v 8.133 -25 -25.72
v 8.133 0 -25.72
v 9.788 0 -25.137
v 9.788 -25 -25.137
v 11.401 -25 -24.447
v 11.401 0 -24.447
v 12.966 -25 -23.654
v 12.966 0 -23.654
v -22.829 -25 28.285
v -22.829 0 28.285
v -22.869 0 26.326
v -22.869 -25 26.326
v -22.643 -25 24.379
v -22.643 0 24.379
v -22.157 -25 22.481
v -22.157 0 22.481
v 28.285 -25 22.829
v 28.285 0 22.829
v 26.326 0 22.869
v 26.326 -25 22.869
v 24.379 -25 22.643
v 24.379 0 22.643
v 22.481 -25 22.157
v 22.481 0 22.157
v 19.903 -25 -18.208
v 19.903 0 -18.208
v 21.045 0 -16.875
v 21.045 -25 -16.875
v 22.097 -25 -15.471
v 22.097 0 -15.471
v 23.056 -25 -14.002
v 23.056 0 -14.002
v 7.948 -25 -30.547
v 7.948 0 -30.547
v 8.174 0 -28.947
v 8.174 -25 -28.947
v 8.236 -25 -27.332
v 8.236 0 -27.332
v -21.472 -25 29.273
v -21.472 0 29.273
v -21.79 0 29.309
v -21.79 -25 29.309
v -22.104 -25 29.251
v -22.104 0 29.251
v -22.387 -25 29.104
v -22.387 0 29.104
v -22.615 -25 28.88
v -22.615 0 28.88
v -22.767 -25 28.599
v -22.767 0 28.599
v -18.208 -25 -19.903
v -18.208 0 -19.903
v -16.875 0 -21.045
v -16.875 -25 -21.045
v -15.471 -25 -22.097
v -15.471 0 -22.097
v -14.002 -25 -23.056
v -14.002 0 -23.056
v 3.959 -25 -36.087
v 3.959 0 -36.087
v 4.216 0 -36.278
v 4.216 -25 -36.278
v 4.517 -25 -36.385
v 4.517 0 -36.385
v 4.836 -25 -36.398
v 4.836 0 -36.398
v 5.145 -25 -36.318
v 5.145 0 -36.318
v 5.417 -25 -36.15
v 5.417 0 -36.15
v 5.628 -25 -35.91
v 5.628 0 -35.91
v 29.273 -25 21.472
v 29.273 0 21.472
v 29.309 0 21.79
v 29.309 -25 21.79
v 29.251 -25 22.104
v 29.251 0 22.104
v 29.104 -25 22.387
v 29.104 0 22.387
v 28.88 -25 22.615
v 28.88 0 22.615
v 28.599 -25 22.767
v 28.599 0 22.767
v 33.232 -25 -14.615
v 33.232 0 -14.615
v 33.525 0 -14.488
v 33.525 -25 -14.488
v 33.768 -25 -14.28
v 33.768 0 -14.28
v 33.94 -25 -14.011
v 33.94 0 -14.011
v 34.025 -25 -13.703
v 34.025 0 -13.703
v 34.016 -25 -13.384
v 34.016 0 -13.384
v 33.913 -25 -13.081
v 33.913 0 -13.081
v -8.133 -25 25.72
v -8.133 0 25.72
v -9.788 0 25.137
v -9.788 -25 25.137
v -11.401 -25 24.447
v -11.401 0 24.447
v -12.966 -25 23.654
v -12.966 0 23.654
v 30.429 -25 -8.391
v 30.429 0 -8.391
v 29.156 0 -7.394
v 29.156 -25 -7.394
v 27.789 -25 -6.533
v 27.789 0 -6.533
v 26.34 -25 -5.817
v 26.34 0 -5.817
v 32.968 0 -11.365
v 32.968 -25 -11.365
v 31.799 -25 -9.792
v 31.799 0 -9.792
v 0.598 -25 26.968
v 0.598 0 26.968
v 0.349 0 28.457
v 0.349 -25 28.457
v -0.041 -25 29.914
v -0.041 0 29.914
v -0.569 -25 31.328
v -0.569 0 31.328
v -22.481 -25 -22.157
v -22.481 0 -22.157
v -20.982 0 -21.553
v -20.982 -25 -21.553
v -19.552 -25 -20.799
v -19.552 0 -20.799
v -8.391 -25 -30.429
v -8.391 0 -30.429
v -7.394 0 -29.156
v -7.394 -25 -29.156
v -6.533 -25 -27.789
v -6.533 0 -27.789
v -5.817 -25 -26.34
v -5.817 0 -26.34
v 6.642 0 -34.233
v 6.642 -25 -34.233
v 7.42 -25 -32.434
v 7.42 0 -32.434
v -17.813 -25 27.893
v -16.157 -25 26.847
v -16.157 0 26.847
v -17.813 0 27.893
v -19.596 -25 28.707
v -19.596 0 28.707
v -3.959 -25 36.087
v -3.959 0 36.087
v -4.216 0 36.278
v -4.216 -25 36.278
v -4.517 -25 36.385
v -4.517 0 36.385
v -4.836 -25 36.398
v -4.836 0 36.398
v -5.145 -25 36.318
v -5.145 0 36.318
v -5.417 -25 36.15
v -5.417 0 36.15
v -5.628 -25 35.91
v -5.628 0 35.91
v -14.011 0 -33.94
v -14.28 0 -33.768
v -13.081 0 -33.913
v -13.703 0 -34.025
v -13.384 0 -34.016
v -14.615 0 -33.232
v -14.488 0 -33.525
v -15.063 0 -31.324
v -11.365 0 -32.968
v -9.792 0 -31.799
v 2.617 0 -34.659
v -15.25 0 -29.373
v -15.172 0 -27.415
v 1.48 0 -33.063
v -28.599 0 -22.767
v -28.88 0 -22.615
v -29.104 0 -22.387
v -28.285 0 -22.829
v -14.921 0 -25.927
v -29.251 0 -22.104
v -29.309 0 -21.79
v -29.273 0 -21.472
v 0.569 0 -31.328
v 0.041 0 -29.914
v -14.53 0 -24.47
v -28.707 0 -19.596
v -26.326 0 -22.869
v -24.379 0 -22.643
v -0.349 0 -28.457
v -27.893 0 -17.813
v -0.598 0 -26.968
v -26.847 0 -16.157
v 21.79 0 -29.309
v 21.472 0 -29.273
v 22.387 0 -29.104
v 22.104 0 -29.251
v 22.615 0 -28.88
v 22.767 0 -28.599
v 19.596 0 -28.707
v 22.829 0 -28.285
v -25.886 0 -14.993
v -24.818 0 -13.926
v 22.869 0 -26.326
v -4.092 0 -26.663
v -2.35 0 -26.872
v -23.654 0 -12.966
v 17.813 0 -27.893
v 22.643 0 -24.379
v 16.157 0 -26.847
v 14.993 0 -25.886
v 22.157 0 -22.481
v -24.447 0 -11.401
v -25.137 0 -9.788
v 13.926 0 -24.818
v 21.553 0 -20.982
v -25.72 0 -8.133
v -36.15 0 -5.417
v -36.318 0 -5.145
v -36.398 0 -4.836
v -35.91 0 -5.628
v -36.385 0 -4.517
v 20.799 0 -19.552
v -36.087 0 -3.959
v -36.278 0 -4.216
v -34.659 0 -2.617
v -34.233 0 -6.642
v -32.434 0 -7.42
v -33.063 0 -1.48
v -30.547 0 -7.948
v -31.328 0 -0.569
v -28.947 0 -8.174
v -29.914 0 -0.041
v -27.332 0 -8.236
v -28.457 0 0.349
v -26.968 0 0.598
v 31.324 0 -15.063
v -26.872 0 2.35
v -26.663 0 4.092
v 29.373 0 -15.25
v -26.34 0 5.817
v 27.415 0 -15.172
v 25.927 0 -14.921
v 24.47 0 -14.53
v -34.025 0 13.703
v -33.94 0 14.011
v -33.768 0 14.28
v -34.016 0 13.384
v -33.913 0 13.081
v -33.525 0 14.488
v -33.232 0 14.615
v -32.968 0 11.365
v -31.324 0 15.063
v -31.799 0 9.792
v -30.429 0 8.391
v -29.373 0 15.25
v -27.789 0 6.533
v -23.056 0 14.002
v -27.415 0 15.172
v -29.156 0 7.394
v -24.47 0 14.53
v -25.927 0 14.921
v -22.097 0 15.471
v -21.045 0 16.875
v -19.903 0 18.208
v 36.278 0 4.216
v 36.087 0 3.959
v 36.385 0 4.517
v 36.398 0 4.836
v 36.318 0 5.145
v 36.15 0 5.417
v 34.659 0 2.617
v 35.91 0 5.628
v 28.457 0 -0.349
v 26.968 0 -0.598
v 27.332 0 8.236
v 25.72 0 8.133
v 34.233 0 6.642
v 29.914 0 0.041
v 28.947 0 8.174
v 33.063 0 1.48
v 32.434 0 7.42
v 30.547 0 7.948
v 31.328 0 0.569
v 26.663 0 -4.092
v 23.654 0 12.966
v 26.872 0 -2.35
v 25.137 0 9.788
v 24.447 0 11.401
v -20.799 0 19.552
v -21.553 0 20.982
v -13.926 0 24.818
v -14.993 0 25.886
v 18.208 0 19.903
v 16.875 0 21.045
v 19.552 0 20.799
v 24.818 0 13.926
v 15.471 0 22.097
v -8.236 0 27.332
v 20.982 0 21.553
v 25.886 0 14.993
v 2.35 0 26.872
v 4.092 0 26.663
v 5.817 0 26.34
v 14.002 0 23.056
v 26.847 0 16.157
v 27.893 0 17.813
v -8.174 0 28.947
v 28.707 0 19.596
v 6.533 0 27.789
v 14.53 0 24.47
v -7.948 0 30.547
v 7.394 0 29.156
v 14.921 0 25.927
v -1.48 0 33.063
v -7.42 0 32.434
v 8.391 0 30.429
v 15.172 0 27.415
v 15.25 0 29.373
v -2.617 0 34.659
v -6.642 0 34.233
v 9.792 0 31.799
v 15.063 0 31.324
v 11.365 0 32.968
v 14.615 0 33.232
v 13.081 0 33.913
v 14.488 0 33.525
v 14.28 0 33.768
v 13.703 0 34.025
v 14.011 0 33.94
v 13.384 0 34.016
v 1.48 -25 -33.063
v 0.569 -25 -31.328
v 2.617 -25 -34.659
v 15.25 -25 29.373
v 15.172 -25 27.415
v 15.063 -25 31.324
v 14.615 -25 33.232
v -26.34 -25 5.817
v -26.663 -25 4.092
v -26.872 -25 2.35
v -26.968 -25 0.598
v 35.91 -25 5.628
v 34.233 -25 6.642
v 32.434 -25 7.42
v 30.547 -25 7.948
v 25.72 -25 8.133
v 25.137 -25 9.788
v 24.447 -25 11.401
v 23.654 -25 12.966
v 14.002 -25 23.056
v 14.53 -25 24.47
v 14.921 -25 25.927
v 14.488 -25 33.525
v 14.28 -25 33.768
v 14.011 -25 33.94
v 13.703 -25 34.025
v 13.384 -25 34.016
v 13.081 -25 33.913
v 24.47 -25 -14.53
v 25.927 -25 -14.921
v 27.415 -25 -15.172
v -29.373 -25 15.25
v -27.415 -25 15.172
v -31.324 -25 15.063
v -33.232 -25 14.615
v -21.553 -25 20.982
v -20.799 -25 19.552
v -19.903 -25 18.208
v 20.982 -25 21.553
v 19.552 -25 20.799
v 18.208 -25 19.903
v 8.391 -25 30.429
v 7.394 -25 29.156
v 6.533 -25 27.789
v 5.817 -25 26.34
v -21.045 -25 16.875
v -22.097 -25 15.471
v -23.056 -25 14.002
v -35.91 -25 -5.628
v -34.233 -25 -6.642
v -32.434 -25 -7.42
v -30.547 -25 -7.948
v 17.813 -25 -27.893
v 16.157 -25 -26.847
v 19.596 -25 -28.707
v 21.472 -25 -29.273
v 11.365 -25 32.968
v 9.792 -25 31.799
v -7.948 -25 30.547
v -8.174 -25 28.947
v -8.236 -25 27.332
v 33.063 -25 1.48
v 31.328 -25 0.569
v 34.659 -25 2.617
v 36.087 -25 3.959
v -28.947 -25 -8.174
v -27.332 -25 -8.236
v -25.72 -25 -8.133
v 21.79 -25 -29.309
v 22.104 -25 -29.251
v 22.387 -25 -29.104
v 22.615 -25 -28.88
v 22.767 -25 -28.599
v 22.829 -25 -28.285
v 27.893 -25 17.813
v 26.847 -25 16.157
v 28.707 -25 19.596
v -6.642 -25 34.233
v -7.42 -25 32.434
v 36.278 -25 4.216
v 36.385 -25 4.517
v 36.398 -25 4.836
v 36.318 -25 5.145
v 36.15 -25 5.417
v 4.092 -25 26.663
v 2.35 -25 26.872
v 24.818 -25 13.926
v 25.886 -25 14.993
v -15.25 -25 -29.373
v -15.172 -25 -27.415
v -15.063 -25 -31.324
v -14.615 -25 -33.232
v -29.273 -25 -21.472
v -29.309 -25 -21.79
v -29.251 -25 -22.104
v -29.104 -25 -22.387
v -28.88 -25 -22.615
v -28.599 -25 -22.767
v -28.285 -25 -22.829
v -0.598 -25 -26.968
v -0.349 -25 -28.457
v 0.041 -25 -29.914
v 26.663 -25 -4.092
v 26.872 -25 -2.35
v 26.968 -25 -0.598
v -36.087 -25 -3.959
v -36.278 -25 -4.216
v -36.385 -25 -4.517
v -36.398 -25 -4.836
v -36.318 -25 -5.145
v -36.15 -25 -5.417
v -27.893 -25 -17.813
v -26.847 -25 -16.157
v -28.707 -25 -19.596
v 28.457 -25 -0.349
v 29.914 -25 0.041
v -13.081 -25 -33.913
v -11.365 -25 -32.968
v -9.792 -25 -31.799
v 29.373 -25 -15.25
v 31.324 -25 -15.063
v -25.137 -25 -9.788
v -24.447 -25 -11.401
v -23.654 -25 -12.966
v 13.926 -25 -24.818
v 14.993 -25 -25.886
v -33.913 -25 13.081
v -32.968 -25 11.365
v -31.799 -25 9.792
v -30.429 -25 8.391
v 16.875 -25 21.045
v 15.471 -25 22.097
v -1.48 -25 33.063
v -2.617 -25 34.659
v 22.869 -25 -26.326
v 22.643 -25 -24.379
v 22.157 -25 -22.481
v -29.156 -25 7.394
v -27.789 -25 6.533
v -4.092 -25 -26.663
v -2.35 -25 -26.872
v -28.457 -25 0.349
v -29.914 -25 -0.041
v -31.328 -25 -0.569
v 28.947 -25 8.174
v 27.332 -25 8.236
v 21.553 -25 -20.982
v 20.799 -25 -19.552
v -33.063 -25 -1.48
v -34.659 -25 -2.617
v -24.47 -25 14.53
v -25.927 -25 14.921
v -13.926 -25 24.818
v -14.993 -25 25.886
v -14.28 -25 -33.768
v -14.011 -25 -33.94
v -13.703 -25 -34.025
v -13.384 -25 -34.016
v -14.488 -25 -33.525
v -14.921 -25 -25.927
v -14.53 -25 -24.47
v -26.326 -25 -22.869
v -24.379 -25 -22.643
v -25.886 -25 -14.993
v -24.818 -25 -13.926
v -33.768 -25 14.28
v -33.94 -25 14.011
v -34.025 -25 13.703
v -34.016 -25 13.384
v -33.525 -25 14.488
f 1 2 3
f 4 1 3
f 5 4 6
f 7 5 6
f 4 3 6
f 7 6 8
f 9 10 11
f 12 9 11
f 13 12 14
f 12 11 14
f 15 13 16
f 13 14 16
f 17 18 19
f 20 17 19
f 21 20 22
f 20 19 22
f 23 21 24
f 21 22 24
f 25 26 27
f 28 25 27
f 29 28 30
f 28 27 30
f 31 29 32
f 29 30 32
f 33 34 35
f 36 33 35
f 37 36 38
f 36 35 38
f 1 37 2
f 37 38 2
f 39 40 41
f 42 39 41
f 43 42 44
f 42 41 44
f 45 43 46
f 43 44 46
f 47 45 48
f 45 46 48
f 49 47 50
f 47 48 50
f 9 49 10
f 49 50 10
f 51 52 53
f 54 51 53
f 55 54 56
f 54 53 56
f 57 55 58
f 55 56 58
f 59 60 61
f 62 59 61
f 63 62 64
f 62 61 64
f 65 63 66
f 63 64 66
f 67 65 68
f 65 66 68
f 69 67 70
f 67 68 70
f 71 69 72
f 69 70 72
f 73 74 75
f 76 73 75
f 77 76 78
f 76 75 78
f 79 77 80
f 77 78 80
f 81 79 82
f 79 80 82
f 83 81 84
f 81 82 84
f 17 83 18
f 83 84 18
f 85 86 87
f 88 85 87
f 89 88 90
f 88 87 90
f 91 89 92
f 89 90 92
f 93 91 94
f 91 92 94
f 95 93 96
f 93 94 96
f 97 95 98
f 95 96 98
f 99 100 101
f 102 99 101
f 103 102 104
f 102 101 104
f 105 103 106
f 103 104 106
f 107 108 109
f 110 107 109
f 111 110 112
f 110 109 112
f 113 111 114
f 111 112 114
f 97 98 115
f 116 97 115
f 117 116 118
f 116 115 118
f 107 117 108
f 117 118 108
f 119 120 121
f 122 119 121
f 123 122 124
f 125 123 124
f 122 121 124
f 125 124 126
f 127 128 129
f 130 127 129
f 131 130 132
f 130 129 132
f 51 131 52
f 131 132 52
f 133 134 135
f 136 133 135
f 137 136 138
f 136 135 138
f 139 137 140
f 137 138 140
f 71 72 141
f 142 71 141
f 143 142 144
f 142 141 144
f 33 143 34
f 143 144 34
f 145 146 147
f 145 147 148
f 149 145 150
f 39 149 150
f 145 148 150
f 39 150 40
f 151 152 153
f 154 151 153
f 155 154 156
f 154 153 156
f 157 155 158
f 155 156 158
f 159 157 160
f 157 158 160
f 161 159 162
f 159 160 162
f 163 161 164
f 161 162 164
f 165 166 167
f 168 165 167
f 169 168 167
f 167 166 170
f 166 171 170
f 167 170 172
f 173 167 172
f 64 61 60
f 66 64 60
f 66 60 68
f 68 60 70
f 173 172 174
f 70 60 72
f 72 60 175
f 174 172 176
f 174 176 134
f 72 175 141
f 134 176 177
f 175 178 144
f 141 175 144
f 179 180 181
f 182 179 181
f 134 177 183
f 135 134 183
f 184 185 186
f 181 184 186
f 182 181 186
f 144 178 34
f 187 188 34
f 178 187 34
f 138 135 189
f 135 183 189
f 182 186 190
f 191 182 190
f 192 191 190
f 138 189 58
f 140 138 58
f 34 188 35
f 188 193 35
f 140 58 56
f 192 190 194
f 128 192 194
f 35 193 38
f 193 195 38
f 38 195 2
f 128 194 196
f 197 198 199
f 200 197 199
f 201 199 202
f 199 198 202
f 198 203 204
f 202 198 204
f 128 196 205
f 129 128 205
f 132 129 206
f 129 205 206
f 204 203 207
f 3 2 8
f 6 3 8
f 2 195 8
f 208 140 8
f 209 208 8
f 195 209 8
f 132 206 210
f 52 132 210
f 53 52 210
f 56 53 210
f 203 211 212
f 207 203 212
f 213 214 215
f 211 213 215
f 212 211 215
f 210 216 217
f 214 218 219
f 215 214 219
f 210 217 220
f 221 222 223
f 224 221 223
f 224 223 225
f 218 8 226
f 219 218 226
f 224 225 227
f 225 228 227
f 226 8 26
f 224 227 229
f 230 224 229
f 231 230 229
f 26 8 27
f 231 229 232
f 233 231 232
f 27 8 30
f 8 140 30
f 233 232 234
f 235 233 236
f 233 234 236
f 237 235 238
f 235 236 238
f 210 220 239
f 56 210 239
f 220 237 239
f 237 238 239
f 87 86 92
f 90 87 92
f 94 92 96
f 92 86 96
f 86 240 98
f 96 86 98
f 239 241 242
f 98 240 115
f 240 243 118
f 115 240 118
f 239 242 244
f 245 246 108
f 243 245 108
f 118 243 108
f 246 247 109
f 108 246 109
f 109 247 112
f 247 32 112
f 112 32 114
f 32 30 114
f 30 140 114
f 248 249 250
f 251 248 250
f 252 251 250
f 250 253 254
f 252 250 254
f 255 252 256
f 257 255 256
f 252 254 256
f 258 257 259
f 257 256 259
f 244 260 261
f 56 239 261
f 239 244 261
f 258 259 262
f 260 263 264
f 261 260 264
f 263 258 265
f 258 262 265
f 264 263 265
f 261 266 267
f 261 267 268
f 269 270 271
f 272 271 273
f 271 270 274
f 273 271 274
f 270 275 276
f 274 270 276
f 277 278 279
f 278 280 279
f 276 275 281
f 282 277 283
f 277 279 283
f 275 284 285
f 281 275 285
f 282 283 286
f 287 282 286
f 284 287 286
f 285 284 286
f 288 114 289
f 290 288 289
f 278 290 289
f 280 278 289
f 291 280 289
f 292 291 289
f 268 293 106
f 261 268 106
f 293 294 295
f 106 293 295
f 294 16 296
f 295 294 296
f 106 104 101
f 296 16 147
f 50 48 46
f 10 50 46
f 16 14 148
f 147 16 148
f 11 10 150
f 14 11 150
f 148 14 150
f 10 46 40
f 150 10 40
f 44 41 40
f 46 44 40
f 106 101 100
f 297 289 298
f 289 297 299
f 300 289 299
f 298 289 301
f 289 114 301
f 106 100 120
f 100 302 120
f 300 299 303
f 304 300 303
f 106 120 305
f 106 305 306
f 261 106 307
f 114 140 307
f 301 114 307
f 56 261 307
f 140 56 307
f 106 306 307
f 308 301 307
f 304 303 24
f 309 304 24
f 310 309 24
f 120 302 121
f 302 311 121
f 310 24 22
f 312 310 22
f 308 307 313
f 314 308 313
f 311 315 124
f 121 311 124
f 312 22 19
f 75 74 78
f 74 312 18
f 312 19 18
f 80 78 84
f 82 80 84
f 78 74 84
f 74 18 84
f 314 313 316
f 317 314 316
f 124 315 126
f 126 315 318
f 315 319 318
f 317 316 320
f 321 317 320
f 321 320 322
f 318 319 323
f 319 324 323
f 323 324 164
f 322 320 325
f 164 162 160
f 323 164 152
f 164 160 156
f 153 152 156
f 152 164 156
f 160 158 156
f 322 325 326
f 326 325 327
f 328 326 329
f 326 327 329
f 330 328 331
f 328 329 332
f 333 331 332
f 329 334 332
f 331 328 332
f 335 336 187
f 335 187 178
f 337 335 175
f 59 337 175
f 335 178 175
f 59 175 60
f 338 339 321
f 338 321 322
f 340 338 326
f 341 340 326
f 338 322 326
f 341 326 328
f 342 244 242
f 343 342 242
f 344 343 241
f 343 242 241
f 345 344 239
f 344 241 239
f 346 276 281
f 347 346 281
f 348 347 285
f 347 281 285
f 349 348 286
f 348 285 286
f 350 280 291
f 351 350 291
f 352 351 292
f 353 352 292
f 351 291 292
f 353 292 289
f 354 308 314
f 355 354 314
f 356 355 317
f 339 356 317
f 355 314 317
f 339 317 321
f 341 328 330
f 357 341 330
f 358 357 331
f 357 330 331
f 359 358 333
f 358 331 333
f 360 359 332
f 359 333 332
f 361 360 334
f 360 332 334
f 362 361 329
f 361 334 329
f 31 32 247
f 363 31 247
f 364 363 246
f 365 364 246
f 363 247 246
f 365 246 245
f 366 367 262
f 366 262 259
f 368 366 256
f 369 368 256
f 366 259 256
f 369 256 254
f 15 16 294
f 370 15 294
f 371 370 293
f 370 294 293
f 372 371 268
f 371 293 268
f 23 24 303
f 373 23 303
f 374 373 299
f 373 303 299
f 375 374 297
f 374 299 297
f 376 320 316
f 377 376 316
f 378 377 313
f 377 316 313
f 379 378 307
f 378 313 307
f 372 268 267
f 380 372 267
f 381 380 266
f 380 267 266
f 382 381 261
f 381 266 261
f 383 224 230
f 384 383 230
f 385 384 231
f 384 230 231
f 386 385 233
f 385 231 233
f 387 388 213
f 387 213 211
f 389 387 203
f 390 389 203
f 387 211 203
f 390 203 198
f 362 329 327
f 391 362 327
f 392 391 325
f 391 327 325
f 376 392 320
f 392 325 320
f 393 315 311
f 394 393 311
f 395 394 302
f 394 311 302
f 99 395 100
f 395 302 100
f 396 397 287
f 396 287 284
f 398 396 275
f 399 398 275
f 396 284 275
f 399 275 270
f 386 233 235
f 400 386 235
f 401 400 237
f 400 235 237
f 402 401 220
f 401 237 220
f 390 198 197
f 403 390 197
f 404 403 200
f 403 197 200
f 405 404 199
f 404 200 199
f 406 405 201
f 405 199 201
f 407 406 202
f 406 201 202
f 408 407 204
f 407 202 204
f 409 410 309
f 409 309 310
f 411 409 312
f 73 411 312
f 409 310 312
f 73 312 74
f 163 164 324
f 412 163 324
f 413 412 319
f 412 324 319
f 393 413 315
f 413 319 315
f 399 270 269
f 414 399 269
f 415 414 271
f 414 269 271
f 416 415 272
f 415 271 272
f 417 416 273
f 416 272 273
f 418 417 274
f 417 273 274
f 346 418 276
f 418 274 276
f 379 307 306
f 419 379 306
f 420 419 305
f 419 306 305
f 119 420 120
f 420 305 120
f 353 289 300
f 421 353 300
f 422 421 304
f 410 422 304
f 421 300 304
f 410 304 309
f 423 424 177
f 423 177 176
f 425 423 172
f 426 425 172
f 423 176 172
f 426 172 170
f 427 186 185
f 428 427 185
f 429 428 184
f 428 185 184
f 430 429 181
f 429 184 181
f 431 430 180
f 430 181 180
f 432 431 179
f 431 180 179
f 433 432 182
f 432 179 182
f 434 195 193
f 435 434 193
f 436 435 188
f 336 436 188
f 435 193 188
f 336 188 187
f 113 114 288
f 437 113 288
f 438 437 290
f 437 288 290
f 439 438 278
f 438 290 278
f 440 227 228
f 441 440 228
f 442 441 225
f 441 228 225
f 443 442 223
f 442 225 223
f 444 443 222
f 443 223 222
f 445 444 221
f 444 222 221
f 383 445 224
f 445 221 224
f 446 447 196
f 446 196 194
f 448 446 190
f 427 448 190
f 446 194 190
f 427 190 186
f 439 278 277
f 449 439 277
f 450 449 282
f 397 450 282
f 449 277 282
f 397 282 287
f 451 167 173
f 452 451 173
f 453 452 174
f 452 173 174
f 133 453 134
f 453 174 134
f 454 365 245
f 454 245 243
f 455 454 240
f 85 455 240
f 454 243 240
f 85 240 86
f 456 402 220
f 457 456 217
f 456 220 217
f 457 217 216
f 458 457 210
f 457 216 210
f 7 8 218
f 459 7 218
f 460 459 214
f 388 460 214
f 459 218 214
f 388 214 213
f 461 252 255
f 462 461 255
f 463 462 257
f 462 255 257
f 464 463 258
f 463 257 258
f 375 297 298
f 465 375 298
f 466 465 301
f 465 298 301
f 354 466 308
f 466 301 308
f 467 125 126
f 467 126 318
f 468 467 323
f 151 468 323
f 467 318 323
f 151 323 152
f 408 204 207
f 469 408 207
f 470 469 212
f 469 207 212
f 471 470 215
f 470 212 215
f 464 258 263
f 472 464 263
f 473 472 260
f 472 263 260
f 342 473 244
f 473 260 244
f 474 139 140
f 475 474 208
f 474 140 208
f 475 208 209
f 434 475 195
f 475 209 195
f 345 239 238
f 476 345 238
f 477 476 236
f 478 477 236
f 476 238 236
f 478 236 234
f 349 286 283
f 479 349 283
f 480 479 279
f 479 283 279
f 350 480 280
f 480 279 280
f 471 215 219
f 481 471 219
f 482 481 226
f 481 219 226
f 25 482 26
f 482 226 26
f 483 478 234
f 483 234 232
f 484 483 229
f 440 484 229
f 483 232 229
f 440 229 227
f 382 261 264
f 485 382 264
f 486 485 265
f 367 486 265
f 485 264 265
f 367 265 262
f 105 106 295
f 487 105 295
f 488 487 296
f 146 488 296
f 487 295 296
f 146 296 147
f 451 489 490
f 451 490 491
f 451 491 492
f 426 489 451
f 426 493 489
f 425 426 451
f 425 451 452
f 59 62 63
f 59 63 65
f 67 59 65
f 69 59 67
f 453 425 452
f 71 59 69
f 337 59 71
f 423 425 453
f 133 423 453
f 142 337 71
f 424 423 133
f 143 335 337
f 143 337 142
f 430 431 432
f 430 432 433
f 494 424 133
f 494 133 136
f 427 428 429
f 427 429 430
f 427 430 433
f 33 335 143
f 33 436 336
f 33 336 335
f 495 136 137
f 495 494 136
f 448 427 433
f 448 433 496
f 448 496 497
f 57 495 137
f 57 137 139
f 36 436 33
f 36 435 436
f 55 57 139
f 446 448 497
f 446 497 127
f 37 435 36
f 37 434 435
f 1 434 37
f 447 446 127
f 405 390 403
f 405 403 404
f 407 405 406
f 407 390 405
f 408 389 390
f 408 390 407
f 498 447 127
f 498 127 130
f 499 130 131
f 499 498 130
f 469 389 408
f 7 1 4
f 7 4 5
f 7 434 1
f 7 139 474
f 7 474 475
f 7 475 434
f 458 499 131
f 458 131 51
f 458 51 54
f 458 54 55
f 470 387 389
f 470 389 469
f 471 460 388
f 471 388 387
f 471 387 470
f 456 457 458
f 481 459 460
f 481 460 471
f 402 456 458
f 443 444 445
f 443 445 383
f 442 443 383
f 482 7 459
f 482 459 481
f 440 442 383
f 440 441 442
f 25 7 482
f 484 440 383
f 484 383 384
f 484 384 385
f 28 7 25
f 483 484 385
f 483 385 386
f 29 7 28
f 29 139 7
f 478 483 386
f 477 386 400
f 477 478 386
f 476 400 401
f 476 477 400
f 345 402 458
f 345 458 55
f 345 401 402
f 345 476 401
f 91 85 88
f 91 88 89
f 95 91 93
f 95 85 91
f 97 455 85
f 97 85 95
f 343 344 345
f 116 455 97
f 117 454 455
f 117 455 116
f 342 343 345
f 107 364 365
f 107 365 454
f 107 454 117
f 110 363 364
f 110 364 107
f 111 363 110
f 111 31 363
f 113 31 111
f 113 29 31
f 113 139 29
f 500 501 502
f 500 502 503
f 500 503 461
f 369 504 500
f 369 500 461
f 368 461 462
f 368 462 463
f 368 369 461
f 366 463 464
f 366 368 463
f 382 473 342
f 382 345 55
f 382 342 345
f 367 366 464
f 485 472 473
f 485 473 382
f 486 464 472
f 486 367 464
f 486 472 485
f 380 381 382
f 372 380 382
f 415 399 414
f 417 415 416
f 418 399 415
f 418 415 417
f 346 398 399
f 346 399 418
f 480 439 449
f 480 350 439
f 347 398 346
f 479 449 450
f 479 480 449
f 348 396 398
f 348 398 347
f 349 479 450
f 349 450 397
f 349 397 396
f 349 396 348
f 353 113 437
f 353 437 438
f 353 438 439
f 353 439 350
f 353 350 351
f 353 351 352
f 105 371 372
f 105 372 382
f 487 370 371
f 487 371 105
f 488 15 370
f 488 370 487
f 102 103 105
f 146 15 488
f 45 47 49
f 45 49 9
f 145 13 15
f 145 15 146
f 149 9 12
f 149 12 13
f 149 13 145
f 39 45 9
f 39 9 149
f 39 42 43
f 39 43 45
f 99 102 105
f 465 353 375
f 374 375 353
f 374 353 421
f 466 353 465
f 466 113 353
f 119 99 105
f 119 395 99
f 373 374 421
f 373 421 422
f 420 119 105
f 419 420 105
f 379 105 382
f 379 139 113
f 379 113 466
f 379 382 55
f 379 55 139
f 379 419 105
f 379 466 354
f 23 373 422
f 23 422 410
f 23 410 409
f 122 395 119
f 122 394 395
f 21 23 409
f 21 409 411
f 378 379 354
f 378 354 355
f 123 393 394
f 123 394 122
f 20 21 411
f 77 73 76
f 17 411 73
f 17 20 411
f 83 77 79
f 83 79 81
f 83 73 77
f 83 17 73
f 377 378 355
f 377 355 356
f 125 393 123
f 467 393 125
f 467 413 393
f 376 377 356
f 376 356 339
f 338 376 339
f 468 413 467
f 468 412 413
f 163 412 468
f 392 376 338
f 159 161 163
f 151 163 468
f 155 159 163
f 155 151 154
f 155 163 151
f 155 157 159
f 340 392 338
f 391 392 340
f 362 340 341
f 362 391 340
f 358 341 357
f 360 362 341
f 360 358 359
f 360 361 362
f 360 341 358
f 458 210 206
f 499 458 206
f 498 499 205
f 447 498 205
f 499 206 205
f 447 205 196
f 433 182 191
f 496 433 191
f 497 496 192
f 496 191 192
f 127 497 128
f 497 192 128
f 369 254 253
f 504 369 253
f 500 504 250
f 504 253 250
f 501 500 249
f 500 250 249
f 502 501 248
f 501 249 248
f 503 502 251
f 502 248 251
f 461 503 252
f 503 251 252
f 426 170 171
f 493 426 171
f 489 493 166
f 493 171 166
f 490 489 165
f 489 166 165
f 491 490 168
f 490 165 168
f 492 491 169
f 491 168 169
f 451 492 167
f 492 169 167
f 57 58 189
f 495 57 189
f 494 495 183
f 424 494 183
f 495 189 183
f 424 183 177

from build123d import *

# Parameters (mm, degrees)
F1_DEPTH = 25
F2_COUNT = 12


with BuildPart() as f1:
    # F0 (on Front) → F1 (new body)
    with BuildSketch(Plane.XZ):
        with BuildLine():
            ThreePointArc((-7.9477143302, 30.5472248468), (-8.2259408607, 28.1405650395), (-8.1327613443, 25.7196687162))
            ThreePointArc((-8.1327613443, 25.7196687162), (-3.8188440215, 26.7031757717), (0.5978189292, 26.9682364733))
            ThreePointArc((0.5978189292, 26.9682364733), (0.1710931502, 29.1900709912), (-0.5687537498, 31.3281238622))
            ThreePointArc((-0.5687537498, 31.3281238622), (-2.0216895742, 33.8802868431), (-3.9594054698, 36.087052689))
            ThreePointArc((-3.9594054698, 36.087052689), (-4.8361287947, 36.3983837804), (-5.6282667199, 35.9104408081))
            ThreePointArc((-5.6282667199, 35.9104408081), (-7.0611591635, 33.3469709651), (-7.9477143302, 30.5472248468))
        make_face()
        with BuildLine():
            ThreePointArc((0.5978189292, 26.9682364733), (-3.8188440215, 26.7031757717), (-8.1327613443, 25.7196687162))
            ThreePointArc((-8.1327613443, 25.7196687162), (-15.9415032716, -21.760322594), (26.9748617412, 0))
            ThreePointArc((26.9748617412, 0), (19.2843103184, 18.8615625412), (0.5978189292, 26.9682364733))
        make_face()
    extrude(amount=F1_DEPTH)

    # F2: F1 ×12 about axis
    f2_axis = Axis((0, 0, 0), (0, 1, 0))


with BuildPart() as f1_1:
    add(f1.part)
    for i in range(1, F2_COUNT):
        add(f1.part.rotate(f2_axis, i * 360 / F2_COUNT))


solid = f1_1.part
